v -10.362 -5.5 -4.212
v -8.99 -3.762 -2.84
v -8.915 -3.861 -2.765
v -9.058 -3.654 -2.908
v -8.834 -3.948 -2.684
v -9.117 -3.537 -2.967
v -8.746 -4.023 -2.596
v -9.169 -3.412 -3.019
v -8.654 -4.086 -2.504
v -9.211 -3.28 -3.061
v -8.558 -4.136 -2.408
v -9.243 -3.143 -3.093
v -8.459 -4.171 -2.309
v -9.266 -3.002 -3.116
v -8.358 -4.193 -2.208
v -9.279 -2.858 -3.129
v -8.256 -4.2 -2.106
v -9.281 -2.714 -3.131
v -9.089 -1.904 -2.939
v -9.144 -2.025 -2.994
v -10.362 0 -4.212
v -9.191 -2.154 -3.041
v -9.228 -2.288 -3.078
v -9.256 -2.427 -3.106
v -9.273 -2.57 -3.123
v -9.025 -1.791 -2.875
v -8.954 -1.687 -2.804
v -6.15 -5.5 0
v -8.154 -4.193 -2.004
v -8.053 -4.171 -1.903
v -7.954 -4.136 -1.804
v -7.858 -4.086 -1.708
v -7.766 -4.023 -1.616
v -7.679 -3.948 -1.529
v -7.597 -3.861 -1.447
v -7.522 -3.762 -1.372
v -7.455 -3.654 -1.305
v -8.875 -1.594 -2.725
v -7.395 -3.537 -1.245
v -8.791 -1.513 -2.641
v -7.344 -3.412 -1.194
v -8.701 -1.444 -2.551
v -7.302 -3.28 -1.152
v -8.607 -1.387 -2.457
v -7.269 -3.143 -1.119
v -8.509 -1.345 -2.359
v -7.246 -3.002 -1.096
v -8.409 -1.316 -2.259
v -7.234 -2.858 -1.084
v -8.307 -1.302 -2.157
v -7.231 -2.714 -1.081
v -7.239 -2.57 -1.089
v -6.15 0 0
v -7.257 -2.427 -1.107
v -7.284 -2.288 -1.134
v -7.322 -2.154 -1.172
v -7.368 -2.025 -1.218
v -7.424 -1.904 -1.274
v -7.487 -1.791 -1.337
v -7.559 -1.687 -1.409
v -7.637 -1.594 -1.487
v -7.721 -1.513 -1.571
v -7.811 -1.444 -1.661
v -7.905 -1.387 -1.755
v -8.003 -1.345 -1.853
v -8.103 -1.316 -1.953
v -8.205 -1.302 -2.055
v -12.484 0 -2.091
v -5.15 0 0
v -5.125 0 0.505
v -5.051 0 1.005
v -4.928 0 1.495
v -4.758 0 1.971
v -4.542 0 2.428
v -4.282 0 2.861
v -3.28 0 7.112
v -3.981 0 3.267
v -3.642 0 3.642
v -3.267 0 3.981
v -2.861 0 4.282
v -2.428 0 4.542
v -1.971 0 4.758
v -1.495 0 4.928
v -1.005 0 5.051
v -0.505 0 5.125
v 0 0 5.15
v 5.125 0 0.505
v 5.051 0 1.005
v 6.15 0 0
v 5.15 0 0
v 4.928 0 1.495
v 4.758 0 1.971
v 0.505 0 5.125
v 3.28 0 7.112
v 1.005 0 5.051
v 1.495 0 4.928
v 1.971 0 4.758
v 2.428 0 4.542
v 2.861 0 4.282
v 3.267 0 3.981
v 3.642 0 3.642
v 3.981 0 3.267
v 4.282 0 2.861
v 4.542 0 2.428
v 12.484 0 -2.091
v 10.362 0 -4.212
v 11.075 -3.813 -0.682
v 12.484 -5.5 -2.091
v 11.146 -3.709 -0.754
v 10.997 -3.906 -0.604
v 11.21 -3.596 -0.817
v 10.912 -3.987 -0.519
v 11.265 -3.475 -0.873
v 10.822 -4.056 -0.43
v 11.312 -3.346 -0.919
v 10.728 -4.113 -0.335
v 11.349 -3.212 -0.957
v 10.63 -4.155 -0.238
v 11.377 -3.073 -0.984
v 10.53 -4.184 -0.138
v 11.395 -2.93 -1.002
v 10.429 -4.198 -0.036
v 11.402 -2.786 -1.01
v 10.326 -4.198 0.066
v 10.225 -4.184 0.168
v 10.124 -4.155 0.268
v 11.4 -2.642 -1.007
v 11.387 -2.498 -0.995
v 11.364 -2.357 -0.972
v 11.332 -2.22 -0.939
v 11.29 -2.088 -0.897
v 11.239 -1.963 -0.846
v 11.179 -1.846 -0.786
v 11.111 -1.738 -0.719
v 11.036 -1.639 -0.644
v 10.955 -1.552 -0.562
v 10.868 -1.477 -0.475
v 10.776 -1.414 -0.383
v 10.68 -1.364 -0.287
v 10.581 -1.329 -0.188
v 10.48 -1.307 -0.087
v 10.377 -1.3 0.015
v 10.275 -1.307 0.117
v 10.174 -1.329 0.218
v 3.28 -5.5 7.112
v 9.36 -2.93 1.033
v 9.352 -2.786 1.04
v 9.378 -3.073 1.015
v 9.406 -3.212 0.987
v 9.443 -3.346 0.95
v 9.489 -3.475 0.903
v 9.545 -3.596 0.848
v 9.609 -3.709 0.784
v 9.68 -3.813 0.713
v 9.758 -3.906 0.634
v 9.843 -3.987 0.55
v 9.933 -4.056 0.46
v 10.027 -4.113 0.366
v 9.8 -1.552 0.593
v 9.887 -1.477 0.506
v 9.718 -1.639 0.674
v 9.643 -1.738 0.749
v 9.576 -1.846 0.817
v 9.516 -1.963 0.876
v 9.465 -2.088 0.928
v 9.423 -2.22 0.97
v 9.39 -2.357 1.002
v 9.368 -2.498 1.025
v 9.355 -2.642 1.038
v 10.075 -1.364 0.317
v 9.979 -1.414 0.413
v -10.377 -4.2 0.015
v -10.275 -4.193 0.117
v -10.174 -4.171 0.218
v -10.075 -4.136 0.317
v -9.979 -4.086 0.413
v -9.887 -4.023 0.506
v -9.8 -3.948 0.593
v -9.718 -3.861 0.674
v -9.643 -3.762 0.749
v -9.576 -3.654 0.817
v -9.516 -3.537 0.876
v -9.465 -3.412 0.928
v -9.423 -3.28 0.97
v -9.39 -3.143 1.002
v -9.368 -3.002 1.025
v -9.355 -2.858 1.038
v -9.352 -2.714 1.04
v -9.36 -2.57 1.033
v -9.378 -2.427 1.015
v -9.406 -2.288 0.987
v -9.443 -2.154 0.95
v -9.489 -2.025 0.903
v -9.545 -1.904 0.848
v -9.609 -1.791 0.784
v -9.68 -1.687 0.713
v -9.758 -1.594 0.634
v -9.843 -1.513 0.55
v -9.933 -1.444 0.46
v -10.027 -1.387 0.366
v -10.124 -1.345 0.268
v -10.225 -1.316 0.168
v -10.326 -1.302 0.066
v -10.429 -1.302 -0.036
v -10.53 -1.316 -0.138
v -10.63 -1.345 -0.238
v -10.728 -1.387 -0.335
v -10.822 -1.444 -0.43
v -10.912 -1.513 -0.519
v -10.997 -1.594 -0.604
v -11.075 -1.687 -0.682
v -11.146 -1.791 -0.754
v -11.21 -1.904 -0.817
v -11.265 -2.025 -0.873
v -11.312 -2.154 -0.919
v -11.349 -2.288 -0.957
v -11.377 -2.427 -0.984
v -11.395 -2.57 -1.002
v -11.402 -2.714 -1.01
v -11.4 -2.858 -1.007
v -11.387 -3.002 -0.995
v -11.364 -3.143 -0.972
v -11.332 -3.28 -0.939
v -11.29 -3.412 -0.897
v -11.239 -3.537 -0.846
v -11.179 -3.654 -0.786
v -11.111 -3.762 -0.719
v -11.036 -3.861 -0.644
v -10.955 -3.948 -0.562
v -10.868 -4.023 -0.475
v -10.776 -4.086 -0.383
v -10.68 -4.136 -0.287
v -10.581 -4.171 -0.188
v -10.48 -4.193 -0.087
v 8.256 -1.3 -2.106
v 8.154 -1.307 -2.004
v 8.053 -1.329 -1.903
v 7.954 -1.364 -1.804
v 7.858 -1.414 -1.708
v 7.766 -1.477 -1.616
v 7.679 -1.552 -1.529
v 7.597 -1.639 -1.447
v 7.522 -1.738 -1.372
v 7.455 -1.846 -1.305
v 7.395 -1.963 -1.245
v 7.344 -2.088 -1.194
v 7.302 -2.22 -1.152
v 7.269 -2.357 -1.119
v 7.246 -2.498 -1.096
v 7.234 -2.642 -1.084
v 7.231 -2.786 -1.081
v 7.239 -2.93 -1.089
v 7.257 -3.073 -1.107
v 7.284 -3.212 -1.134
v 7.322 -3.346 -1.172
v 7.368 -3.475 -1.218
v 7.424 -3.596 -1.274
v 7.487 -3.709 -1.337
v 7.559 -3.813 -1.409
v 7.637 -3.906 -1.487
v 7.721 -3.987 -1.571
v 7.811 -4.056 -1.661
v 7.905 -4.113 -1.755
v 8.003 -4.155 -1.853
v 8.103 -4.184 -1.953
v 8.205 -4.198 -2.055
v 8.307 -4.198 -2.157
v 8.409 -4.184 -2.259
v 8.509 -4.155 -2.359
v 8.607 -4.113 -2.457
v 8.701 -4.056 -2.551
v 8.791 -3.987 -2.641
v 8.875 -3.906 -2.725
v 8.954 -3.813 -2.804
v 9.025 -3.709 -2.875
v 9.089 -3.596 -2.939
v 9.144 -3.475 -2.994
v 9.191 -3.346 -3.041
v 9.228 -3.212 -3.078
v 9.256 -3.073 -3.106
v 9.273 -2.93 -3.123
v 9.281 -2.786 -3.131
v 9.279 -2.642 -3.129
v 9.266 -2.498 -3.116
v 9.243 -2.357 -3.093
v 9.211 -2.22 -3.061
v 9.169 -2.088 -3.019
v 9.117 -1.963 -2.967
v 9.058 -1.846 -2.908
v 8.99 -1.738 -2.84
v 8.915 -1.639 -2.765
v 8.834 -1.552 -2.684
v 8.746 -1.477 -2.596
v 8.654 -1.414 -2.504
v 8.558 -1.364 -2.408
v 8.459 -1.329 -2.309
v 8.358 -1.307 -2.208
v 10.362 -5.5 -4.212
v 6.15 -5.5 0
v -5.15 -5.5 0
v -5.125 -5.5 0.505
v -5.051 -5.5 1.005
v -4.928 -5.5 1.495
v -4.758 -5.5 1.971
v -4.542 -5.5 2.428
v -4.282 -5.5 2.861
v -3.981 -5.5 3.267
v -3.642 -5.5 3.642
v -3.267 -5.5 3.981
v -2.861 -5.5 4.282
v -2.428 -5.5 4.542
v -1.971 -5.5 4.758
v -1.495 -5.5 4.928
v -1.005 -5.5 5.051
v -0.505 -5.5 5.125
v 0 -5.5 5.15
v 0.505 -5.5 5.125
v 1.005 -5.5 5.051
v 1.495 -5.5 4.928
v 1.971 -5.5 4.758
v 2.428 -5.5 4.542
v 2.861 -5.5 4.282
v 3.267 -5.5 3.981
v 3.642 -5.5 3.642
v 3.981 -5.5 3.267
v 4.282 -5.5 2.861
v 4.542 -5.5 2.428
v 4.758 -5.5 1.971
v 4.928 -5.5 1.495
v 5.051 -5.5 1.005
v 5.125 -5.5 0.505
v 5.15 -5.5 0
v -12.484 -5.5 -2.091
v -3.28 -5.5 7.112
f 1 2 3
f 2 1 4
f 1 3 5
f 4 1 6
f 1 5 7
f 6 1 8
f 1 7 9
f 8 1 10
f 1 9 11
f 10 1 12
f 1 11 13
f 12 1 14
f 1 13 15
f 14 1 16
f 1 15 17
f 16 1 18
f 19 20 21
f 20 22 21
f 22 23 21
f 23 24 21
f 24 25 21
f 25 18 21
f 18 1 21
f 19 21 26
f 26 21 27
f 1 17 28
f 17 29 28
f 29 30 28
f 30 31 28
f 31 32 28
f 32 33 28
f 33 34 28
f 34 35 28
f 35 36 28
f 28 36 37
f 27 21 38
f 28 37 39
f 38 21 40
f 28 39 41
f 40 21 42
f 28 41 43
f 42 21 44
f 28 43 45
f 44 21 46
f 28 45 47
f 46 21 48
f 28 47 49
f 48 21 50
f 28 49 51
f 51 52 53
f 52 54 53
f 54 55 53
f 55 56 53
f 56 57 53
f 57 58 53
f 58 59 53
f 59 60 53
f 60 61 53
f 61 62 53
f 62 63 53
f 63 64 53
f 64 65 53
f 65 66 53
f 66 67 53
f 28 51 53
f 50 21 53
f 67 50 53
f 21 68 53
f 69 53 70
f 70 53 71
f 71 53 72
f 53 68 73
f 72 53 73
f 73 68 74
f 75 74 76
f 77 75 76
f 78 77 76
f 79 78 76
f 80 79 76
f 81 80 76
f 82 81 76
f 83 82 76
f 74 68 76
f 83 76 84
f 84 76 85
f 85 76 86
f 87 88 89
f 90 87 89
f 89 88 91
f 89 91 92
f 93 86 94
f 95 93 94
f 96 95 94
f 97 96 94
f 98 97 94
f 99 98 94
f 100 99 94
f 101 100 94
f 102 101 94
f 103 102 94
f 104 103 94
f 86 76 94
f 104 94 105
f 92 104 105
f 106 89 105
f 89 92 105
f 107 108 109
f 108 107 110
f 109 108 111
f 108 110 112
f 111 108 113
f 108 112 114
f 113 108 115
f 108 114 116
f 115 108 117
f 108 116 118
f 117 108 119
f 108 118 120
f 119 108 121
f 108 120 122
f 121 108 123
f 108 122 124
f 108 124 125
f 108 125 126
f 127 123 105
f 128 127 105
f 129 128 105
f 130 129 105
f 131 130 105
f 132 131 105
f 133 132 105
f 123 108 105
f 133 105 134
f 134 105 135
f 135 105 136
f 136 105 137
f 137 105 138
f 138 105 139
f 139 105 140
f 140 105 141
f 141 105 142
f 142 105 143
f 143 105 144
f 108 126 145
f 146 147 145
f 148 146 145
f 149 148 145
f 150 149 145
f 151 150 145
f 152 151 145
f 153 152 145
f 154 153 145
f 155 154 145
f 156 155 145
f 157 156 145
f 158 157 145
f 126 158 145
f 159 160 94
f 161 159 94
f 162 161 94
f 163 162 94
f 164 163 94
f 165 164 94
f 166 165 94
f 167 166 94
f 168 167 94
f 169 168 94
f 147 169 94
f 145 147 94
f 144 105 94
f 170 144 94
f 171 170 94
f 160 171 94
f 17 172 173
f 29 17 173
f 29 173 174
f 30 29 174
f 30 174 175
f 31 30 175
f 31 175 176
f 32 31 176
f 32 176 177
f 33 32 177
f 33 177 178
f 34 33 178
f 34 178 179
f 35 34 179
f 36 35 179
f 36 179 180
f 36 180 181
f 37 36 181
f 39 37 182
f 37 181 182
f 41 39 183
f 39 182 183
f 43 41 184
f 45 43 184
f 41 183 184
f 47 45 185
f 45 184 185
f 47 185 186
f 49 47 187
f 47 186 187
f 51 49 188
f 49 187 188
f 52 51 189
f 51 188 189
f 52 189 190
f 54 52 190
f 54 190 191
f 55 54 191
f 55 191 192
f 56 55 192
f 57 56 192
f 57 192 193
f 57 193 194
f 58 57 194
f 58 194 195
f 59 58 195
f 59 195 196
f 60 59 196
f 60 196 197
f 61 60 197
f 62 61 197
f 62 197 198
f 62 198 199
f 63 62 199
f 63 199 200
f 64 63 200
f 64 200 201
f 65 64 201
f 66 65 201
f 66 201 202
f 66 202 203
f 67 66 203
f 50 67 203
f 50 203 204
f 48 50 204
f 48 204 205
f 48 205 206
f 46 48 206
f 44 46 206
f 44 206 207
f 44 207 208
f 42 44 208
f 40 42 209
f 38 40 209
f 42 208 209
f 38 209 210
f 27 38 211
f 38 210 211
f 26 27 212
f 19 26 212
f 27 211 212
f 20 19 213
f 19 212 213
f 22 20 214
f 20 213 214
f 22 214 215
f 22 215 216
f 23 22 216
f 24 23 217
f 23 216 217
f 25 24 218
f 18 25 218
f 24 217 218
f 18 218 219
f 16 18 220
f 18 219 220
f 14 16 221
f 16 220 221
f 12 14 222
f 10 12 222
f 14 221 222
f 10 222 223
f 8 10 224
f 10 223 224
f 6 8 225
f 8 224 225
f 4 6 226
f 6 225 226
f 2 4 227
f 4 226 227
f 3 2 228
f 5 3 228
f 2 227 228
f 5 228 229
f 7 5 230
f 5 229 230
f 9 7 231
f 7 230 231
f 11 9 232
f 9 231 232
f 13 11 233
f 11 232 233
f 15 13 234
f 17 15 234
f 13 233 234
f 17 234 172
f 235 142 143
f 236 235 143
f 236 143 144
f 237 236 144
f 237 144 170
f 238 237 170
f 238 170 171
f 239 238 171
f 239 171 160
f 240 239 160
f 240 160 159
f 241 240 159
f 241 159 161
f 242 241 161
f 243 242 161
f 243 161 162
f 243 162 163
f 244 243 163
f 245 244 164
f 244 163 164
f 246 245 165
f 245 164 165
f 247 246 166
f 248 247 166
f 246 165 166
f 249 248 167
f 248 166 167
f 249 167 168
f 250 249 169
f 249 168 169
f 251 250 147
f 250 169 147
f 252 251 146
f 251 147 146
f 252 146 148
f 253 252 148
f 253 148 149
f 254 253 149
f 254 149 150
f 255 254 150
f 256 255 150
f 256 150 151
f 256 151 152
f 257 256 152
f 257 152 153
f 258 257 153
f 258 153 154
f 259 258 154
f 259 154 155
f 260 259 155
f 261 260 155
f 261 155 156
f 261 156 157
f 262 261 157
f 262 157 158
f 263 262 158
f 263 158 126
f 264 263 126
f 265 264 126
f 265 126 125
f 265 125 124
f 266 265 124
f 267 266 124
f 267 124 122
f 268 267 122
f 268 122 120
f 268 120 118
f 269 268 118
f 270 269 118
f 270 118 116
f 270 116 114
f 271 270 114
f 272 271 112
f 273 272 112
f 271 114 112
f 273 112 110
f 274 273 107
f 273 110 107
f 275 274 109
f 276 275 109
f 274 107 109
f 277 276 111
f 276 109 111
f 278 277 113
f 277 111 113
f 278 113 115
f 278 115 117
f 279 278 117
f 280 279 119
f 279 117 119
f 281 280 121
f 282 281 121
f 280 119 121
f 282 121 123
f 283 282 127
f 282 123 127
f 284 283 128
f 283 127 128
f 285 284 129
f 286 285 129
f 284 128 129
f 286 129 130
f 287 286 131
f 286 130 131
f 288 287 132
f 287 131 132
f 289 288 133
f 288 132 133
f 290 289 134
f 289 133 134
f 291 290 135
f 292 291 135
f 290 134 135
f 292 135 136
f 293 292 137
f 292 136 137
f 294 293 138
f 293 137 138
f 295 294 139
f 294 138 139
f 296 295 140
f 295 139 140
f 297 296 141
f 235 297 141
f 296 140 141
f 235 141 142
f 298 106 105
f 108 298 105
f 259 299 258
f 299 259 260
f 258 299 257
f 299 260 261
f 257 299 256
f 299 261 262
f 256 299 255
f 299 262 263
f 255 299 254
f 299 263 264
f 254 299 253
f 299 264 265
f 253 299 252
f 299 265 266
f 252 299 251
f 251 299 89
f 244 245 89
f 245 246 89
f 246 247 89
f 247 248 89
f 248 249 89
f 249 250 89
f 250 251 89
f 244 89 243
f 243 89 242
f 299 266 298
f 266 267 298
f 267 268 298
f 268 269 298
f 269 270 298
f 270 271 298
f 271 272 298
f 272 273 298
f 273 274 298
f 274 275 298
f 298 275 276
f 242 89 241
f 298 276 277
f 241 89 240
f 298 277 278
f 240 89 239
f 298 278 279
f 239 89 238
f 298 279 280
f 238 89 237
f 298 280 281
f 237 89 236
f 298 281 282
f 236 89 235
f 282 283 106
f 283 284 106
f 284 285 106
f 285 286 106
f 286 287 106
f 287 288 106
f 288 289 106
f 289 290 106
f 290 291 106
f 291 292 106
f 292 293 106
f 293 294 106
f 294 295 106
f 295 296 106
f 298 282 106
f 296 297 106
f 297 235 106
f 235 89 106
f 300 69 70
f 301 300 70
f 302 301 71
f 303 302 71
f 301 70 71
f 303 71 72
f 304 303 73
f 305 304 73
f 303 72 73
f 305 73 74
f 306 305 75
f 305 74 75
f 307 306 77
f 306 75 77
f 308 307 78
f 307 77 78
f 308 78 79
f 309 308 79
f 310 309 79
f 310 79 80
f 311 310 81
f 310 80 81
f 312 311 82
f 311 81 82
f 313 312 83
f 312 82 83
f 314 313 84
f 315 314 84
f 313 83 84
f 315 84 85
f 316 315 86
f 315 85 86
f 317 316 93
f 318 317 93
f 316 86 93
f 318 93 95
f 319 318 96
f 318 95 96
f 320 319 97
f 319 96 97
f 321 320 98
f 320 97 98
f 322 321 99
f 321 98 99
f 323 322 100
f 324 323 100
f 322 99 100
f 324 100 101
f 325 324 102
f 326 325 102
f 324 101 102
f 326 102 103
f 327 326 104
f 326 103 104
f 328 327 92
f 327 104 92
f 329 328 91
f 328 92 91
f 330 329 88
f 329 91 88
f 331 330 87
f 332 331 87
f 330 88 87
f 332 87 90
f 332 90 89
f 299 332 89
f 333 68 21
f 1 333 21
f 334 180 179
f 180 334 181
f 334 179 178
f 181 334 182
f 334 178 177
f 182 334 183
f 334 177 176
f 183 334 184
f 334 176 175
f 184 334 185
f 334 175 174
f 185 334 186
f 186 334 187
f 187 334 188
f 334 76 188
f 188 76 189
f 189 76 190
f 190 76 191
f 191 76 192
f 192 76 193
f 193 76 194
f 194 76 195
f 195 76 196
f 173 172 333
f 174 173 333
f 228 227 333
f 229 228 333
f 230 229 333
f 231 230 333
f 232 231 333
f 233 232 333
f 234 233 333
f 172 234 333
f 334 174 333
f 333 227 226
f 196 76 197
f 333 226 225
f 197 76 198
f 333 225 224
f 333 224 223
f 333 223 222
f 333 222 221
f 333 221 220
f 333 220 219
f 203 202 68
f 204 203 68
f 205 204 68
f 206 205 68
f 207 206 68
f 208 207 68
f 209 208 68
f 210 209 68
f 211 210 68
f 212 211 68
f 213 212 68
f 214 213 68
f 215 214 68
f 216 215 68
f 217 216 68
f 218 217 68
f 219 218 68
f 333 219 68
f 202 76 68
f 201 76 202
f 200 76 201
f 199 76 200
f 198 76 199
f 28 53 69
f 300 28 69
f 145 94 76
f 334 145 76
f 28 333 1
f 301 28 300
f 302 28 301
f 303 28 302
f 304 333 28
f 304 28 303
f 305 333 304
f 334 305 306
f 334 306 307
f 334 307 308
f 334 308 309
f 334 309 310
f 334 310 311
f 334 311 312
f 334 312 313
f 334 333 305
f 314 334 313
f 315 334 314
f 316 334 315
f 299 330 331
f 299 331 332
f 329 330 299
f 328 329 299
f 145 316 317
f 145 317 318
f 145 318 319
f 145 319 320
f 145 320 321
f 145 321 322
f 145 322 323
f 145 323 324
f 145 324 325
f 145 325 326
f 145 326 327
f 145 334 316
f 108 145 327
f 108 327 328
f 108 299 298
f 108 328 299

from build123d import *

# Parameters (mm, degrees)
F1_DEPTH = 5.5
F2_R     = 1.45
F3_DEPTH = 25
F4_R     = 1.45
F5_DEPTH = 25


with BuildPart() as f1:
    # F0 (on Front) → F1 (new body)
    with BuildSketch(Plane.XZ):
        with BuildLine():
            ThreePointArc((-5.15, 0), (0, 5.15), (5.15, 0))
            Line((5.15, 0), (6.15, 0))
            Line((6.15, 0), (10.362235, -4.212235))
            Line((10.362235, -4.212235), (12.483555, -2.090915))
            Line((12.483555, -2.090915), (3.280338, 7.112302))
            Line((3.280338, 7.112302), (-3.280338, 7.112302))
            Line((-3.280338, 7.112302), (-12.483555, -2.090915))
            Line((-12.483555, -2.090915), (-10.362235, -4.212235))
            Line((-10.362235, -4.212235), (-6.15, 0))
            Line((-6.15, 0), (-5.15, 0))
        make_face()
    extrude(amount=F1_DEPTH)

    # F2 (on face) → F3 (cut)
    with BuildSketch(Plane(origin=(-5.19632, 0, 5.19632), x_dir=(0, -1, 0), z_dir=(-0.707107, 0, 0.707107))):
        with Locations((2.75, -7.327207)):
            Circle(F2_R)
    extrude(amount=-F3_DEPTH, mode=Mode.SUBTRACT)

    # F4 (on face) → F5 (cut)
    with BuildSketch(Plane(origin=(5.19632, 0, 5.19632), x_dir=(0, 1, 0), z_dir=(0.707107, 0, 0.707107))):
        with Locations((-2.75, -7.327207)):
            Circle(F4_R)
    extrude(amount=-F5_DEPTH, mode=Mode.SUBTRACT)


solid = f1.part
